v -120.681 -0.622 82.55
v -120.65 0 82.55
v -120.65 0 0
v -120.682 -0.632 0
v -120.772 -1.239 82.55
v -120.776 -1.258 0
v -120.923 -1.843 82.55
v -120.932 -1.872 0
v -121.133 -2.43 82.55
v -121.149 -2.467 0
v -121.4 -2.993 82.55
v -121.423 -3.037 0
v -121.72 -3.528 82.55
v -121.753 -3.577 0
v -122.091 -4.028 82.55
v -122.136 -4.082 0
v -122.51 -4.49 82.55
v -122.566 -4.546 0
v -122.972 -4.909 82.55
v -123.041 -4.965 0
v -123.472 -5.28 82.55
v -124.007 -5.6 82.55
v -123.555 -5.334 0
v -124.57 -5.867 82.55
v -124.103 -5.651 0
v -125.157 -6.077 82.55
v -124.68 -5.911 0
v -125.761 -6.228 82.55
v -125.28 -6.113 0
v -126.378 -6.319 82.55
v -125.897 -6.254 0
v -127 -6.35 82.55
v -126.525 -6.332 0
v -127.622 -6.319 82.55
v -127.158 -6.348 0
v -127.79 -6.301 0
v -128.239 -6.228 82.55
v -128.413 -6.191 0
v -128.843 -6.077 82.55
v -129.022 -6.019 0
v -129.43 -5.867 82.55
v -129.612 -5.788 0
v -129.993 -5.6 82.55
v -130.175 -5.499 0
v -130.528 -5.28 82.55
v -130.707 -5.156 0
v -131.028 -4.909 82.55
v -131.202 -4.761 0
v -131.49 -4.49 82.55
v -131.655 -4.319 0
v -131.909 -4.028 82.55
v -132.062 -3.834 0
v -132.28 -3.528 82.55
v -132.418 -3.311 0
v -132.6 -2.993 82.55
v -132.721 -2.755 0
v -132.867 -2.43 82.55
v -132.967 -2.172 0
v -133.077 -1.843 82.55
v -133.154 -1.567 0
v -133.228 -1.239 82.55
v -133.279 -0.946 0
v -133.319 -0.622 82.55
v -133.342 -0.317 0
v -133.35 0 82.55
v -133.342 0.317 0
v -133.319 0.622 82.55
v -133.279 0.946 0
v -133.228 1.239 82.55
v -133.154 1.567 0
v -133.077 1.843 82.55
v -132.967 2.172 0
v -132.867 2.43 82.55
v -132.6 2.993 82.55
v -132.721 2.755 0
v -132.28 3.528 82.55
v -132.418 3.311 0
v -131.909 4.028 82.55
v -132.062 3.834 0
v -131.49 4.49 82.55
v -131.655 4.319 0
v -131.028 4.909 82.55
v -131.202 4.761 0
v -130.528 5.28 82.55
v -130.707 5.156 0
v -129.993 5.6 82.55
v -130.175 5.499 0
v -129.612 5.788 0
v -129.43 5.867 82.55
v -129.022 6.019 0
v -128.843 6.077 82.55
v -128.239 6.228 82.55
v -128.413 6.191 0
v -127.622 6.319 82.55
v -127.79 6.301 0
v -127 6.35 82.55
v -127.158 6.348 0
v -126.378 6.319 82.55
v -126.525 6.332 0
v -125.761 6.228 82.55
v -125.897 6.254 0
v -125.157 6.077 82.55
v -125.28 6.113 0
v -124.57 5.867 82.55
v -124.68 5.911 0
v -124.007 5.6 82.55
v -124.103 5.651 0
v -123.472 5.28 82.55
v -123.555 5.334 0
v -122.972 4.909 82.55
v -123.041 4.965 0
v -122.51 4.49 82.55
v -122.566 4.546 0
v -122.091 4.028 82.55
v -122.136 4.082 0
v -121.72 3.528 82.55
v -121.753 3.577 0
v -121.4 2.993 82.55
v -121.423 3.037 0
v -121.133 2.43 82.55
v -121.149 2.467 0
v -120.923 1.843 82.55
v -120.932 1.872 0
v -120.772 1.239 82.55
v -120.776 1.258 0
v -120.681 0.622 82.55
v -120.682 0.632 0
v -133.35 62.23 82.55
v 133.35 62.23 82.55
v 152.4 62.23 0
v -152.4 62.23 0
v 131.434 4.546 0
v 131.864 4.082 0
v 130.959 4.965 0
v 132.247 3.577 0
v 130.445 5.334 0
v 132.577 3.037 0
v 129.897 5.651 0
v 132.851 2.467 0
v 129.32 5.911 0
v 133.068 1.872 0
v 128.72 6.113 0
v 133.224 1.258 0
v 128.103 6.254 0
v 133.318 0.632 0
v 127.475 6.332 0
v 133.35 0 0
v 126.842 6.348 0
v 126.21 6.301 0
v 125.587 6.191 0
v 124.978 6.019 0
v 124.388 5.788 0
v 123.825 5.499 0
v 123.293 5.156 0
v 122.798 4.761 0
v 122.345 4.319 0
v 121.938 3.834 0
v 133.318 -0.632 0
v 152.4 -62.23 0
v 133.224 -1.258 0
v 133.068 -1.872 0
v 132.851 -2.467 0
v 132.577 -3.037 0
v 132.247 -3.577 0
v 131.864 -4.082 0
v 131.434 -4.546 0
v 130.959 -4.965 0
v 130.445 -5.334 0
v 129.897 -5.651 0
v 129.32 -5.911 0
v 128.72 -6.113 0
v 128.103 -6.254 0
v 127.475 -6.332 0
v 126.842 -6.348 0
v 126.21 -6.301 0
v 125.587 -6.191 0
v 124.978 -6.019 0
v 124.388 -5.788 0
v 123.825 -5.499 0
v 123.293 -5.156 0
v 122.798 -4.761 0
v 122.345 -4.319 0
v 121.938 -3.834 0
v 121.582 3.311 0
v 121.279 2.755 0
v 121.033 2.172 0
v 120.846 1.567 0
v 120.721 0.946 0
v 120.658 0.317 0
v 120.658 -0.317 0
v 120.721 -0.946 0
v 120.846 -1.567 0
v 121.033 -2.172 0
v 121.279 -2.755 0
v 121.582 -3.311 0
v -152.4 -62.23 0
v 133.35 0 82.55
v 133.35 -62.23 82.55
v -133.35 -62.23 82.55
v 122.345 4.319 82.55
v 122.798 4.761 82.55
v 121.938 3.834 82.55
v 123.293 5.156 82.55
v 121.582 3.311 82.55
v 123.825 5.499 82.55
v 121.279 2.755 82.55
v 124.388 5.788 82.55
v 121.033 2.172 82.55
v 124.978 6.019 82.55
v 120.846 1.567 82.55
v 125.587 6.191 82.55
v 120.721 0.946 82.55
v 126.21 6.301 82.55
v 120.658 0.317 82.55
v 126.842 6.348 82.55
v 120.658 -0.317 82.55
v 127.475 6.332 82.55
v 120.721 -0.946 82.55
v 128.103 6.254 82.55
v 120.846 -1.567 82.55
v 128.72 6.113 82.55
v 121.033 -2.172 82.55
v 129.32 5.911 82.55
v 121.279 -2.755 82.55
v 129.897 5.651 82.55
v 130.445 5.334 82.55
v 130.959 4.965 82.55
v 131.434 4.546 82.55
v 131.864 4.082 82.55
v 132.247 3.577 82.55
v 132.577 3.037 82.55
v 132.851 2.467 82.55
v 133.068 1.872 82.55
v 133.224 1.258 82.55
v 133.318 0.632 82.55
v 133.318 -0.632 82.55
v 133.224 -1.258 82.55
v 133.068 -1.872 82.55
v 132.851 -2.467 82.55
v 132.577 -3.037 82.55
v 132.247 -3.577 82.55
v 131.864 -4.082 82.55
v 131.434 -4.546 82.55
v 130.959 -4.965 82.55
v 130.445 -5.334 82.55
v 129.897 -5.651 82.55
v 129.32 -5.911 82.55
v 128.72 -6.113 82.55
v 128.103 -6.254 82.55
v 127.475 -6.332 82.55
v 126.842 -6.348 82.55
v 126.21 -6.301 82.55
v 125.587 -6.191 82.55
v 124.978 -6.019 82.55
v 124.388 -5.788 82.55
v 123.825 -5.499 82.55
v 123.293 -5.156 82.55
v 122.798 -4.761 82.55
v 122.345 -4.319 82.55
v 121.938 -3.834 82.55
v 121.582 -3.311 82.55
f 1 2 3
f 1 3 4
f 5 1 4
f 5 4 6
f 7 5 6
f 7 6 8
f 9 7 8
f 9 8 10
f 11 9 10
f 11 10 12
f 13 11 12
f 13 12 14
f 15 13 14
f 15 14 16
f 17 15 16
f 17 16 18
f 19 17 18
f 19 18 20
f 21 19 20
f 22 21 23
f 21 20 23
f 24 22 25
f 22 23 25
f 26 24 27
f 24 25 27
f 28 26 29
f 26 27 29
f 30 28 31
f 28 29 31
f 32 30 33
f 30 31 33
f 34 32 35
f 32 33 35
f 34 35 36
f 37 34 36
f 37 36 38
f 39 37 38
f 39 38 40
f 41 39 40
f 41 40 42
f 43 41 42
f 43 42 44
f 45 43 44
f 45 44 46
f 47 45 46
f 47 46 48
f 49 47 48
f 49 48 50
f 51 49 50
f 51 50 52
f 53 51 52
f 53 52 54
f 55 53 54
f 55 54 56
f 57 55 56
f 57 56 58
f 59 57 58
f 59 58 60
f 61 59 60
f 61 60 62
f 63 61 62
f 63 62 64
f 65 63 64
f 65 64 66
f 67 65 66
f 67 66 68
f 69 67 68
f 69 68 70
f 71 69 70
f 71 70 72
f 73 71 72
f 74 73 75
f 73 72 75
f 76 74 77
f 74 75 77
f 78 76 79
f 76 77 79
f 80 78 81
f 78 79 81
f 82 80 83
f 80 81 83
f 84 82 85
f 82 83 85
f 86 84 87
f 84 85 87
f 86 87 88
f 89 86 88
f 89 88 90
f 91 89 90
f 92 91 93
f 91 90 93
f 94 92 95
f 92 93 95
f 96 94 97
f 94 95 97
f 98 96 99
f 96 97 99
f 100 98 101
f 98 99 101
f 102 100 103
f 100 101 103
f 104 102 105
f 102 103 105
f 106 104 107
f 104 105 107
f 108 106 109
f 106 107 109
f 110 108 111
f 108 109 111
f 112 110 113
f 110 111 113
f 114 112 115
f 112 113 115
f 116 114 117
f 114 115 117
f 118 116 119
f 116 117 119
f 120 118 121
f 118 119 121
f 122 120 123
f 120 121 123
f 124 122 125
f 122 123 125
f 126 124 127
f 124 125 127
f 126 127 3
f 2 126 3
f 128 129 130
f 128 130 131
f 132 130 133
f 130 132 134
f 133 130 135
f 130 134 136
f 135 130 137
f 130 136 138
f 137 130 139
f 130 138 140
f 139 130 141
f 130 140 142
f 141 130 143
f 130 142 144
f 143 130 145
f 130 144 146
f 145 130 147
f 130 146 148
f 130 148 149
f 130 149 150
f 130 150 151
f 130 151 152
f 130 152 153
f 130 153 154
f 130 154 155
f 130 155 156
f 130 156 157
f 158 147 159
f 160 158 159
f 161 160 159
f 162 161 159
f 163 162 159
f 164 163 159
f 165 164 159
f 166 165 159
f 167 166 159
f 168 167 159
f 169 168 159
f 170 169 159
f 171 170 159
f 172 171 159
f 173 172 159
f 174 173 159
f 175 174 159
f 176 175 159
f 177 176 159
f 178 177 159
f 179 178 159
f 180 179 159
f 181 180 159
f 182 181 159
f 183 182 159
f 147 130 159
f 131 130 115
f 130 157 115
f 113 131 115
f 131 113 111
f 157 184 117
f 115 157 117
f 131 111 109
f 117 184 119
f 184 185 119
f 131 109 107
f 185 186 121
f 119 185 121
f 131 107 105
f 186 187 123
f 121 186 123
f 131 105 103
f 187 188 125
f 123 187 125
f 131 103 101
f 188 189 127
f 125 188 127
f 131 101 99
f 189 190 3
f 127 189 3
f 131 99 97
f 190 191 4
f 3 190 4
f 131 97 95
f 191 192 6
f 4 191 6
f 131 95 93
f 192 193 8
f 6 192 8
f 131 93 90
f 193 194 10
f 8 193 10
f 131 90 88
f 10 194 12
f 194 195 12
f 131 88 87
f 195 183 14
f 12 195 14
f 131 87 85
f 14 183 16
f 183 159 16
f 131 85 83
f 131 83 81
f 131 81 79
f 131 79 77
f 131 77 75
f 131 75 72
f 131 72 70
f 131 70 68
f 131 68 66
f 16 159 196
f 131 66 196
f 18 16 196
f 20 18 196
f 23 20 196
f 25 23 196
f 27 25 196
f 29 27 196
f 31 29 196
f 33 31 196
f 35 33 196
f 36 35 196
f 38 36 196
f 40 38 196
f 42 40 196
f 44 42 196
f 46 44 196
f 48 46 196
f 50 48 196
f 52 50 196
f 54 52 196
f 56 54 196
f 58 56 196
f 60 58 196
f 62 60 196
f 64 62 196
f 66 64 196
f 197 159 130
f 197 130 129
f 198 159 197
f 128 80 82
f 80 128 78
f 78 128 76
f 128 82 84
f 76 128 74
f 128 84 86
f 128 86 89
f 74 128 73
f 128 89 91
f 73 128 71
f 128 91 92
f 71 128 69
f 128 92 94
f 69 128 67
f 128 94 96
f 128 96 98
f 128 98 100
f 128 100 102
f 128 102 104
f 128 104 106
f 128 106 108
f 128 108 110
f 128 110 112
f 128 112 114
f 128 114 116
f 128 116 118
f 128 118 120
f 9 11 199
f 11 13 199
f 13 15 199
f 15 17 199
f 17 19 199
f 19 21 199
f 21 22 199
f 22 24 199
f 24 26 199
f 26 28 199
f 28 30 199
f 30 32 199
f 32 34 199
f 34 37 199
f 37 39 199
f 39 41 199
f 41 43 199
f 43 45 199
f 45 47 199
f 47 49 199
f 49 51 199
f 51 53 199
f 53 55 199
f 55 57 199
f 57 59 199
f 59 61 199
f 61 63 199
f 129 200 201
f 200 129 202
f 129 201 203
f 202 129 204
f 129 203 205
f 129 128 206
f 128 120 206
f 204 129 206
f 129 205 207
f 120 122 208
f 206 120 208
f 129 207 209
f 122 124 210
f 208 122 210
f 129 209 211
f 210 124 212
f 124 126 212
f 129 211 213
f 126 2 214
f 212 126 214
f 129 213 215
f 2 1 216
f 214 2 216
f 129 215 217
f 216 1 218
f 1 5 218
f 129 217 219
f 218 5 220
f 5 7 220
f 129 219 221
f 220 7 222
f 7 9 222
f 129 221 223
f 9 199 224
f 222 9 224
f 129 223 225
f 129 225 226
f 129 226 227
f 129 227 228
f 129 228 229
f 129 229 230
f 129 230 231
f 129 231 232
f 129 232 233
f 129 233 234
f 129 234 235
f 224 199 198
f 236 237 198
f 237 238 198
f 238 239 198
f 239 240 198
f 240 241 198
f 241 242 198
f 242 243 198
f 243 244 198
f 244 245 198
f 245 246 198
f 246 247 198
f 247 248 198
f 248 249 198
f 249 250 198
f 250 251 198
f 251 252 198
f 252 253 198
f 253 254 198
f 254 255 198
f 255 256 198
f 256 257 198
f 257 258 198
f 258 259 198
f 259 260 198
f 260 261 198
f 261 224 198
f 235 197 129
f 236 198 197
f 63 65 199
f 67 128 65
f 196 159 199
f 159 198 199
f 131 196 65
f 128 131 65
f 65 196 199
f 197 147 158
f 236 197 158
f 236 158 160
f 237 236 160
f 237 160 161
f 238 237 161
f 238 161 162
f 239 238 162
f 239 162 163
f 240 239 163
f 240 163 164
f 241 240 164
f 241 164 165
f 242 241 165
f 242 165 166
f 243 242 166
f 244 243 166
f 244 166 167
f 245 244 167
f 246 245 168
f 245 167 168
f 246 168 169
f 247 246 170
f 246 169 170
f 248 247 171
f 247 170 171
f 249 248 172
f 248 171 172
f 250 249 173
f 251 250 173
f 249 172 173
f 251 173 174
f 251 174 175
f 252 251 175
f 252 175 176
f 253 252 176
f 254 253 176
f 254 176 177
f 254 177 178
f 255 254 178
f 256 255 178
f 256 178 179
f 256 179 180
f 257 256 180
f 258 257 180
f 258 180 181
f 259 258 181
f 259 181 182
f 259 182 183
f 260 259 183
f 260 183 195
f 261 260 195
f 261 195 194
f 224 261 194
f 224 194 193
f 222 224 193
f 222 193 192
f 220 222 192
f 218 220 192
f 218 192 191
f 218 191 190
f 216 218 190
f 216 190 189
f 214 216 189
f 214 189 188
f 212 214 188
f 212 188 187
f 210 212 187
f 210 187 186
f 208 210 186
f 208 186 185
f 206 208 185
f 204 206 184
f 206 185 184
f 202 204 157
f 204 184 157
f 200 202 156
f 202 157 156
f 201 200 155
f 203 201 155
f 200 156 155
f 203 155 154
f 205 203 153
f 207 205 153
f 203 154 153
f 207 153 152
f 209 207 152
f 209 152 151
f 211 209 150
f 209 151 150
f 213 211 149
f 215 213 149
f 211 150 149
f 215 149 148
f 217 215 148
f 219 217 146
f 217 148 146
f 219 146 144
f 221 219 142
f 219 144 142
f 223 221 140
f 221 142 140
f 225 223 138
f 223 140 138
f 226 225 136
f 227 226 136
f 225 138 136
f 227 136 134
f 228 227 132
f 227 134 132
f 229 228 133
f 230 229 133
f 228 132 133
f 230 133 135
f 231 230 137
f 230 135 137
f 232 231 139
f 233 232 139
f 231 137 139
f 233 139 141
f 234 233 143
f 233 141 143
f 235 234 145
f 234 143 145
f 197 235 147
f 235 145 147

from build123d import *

# Parameters (mm, degrees)
F1_DEPTH = 62.23
F3_R     = 6.35
F4_DEPTH = 82.551


with BuildPart() as f1:
    # F0 (on Front) → F1 (new body, symmetric)
    with BuildSketch(Plane.XZ):
        Polygon((0, 82.55), (0, 0), (152.4, 0), (133.35, 82.55), align=None)
    extrude(amount=F1_DEPTH, both=True)

    # F2: F1 across plane


with BuildPart() as f1_1:
    add(f1.part)
    add(f1.part.mirror(Plane.YZ))

    # F3 (on face) → F4 (cut, through all)
    with BuildSketch(Plane(origin=(0, 0, 0), x_dir=(1, 0, 0), z_dir=(0, 0, -1))):
        with Locations((127, 0)):
            Circle(F3_R)
        with Locations((-127, 0)):
            Circle(F3_R)
    extrude(amount=-F4_DEPTH, mode=Mode.SUBTRACT)


solid = f1_1.part
